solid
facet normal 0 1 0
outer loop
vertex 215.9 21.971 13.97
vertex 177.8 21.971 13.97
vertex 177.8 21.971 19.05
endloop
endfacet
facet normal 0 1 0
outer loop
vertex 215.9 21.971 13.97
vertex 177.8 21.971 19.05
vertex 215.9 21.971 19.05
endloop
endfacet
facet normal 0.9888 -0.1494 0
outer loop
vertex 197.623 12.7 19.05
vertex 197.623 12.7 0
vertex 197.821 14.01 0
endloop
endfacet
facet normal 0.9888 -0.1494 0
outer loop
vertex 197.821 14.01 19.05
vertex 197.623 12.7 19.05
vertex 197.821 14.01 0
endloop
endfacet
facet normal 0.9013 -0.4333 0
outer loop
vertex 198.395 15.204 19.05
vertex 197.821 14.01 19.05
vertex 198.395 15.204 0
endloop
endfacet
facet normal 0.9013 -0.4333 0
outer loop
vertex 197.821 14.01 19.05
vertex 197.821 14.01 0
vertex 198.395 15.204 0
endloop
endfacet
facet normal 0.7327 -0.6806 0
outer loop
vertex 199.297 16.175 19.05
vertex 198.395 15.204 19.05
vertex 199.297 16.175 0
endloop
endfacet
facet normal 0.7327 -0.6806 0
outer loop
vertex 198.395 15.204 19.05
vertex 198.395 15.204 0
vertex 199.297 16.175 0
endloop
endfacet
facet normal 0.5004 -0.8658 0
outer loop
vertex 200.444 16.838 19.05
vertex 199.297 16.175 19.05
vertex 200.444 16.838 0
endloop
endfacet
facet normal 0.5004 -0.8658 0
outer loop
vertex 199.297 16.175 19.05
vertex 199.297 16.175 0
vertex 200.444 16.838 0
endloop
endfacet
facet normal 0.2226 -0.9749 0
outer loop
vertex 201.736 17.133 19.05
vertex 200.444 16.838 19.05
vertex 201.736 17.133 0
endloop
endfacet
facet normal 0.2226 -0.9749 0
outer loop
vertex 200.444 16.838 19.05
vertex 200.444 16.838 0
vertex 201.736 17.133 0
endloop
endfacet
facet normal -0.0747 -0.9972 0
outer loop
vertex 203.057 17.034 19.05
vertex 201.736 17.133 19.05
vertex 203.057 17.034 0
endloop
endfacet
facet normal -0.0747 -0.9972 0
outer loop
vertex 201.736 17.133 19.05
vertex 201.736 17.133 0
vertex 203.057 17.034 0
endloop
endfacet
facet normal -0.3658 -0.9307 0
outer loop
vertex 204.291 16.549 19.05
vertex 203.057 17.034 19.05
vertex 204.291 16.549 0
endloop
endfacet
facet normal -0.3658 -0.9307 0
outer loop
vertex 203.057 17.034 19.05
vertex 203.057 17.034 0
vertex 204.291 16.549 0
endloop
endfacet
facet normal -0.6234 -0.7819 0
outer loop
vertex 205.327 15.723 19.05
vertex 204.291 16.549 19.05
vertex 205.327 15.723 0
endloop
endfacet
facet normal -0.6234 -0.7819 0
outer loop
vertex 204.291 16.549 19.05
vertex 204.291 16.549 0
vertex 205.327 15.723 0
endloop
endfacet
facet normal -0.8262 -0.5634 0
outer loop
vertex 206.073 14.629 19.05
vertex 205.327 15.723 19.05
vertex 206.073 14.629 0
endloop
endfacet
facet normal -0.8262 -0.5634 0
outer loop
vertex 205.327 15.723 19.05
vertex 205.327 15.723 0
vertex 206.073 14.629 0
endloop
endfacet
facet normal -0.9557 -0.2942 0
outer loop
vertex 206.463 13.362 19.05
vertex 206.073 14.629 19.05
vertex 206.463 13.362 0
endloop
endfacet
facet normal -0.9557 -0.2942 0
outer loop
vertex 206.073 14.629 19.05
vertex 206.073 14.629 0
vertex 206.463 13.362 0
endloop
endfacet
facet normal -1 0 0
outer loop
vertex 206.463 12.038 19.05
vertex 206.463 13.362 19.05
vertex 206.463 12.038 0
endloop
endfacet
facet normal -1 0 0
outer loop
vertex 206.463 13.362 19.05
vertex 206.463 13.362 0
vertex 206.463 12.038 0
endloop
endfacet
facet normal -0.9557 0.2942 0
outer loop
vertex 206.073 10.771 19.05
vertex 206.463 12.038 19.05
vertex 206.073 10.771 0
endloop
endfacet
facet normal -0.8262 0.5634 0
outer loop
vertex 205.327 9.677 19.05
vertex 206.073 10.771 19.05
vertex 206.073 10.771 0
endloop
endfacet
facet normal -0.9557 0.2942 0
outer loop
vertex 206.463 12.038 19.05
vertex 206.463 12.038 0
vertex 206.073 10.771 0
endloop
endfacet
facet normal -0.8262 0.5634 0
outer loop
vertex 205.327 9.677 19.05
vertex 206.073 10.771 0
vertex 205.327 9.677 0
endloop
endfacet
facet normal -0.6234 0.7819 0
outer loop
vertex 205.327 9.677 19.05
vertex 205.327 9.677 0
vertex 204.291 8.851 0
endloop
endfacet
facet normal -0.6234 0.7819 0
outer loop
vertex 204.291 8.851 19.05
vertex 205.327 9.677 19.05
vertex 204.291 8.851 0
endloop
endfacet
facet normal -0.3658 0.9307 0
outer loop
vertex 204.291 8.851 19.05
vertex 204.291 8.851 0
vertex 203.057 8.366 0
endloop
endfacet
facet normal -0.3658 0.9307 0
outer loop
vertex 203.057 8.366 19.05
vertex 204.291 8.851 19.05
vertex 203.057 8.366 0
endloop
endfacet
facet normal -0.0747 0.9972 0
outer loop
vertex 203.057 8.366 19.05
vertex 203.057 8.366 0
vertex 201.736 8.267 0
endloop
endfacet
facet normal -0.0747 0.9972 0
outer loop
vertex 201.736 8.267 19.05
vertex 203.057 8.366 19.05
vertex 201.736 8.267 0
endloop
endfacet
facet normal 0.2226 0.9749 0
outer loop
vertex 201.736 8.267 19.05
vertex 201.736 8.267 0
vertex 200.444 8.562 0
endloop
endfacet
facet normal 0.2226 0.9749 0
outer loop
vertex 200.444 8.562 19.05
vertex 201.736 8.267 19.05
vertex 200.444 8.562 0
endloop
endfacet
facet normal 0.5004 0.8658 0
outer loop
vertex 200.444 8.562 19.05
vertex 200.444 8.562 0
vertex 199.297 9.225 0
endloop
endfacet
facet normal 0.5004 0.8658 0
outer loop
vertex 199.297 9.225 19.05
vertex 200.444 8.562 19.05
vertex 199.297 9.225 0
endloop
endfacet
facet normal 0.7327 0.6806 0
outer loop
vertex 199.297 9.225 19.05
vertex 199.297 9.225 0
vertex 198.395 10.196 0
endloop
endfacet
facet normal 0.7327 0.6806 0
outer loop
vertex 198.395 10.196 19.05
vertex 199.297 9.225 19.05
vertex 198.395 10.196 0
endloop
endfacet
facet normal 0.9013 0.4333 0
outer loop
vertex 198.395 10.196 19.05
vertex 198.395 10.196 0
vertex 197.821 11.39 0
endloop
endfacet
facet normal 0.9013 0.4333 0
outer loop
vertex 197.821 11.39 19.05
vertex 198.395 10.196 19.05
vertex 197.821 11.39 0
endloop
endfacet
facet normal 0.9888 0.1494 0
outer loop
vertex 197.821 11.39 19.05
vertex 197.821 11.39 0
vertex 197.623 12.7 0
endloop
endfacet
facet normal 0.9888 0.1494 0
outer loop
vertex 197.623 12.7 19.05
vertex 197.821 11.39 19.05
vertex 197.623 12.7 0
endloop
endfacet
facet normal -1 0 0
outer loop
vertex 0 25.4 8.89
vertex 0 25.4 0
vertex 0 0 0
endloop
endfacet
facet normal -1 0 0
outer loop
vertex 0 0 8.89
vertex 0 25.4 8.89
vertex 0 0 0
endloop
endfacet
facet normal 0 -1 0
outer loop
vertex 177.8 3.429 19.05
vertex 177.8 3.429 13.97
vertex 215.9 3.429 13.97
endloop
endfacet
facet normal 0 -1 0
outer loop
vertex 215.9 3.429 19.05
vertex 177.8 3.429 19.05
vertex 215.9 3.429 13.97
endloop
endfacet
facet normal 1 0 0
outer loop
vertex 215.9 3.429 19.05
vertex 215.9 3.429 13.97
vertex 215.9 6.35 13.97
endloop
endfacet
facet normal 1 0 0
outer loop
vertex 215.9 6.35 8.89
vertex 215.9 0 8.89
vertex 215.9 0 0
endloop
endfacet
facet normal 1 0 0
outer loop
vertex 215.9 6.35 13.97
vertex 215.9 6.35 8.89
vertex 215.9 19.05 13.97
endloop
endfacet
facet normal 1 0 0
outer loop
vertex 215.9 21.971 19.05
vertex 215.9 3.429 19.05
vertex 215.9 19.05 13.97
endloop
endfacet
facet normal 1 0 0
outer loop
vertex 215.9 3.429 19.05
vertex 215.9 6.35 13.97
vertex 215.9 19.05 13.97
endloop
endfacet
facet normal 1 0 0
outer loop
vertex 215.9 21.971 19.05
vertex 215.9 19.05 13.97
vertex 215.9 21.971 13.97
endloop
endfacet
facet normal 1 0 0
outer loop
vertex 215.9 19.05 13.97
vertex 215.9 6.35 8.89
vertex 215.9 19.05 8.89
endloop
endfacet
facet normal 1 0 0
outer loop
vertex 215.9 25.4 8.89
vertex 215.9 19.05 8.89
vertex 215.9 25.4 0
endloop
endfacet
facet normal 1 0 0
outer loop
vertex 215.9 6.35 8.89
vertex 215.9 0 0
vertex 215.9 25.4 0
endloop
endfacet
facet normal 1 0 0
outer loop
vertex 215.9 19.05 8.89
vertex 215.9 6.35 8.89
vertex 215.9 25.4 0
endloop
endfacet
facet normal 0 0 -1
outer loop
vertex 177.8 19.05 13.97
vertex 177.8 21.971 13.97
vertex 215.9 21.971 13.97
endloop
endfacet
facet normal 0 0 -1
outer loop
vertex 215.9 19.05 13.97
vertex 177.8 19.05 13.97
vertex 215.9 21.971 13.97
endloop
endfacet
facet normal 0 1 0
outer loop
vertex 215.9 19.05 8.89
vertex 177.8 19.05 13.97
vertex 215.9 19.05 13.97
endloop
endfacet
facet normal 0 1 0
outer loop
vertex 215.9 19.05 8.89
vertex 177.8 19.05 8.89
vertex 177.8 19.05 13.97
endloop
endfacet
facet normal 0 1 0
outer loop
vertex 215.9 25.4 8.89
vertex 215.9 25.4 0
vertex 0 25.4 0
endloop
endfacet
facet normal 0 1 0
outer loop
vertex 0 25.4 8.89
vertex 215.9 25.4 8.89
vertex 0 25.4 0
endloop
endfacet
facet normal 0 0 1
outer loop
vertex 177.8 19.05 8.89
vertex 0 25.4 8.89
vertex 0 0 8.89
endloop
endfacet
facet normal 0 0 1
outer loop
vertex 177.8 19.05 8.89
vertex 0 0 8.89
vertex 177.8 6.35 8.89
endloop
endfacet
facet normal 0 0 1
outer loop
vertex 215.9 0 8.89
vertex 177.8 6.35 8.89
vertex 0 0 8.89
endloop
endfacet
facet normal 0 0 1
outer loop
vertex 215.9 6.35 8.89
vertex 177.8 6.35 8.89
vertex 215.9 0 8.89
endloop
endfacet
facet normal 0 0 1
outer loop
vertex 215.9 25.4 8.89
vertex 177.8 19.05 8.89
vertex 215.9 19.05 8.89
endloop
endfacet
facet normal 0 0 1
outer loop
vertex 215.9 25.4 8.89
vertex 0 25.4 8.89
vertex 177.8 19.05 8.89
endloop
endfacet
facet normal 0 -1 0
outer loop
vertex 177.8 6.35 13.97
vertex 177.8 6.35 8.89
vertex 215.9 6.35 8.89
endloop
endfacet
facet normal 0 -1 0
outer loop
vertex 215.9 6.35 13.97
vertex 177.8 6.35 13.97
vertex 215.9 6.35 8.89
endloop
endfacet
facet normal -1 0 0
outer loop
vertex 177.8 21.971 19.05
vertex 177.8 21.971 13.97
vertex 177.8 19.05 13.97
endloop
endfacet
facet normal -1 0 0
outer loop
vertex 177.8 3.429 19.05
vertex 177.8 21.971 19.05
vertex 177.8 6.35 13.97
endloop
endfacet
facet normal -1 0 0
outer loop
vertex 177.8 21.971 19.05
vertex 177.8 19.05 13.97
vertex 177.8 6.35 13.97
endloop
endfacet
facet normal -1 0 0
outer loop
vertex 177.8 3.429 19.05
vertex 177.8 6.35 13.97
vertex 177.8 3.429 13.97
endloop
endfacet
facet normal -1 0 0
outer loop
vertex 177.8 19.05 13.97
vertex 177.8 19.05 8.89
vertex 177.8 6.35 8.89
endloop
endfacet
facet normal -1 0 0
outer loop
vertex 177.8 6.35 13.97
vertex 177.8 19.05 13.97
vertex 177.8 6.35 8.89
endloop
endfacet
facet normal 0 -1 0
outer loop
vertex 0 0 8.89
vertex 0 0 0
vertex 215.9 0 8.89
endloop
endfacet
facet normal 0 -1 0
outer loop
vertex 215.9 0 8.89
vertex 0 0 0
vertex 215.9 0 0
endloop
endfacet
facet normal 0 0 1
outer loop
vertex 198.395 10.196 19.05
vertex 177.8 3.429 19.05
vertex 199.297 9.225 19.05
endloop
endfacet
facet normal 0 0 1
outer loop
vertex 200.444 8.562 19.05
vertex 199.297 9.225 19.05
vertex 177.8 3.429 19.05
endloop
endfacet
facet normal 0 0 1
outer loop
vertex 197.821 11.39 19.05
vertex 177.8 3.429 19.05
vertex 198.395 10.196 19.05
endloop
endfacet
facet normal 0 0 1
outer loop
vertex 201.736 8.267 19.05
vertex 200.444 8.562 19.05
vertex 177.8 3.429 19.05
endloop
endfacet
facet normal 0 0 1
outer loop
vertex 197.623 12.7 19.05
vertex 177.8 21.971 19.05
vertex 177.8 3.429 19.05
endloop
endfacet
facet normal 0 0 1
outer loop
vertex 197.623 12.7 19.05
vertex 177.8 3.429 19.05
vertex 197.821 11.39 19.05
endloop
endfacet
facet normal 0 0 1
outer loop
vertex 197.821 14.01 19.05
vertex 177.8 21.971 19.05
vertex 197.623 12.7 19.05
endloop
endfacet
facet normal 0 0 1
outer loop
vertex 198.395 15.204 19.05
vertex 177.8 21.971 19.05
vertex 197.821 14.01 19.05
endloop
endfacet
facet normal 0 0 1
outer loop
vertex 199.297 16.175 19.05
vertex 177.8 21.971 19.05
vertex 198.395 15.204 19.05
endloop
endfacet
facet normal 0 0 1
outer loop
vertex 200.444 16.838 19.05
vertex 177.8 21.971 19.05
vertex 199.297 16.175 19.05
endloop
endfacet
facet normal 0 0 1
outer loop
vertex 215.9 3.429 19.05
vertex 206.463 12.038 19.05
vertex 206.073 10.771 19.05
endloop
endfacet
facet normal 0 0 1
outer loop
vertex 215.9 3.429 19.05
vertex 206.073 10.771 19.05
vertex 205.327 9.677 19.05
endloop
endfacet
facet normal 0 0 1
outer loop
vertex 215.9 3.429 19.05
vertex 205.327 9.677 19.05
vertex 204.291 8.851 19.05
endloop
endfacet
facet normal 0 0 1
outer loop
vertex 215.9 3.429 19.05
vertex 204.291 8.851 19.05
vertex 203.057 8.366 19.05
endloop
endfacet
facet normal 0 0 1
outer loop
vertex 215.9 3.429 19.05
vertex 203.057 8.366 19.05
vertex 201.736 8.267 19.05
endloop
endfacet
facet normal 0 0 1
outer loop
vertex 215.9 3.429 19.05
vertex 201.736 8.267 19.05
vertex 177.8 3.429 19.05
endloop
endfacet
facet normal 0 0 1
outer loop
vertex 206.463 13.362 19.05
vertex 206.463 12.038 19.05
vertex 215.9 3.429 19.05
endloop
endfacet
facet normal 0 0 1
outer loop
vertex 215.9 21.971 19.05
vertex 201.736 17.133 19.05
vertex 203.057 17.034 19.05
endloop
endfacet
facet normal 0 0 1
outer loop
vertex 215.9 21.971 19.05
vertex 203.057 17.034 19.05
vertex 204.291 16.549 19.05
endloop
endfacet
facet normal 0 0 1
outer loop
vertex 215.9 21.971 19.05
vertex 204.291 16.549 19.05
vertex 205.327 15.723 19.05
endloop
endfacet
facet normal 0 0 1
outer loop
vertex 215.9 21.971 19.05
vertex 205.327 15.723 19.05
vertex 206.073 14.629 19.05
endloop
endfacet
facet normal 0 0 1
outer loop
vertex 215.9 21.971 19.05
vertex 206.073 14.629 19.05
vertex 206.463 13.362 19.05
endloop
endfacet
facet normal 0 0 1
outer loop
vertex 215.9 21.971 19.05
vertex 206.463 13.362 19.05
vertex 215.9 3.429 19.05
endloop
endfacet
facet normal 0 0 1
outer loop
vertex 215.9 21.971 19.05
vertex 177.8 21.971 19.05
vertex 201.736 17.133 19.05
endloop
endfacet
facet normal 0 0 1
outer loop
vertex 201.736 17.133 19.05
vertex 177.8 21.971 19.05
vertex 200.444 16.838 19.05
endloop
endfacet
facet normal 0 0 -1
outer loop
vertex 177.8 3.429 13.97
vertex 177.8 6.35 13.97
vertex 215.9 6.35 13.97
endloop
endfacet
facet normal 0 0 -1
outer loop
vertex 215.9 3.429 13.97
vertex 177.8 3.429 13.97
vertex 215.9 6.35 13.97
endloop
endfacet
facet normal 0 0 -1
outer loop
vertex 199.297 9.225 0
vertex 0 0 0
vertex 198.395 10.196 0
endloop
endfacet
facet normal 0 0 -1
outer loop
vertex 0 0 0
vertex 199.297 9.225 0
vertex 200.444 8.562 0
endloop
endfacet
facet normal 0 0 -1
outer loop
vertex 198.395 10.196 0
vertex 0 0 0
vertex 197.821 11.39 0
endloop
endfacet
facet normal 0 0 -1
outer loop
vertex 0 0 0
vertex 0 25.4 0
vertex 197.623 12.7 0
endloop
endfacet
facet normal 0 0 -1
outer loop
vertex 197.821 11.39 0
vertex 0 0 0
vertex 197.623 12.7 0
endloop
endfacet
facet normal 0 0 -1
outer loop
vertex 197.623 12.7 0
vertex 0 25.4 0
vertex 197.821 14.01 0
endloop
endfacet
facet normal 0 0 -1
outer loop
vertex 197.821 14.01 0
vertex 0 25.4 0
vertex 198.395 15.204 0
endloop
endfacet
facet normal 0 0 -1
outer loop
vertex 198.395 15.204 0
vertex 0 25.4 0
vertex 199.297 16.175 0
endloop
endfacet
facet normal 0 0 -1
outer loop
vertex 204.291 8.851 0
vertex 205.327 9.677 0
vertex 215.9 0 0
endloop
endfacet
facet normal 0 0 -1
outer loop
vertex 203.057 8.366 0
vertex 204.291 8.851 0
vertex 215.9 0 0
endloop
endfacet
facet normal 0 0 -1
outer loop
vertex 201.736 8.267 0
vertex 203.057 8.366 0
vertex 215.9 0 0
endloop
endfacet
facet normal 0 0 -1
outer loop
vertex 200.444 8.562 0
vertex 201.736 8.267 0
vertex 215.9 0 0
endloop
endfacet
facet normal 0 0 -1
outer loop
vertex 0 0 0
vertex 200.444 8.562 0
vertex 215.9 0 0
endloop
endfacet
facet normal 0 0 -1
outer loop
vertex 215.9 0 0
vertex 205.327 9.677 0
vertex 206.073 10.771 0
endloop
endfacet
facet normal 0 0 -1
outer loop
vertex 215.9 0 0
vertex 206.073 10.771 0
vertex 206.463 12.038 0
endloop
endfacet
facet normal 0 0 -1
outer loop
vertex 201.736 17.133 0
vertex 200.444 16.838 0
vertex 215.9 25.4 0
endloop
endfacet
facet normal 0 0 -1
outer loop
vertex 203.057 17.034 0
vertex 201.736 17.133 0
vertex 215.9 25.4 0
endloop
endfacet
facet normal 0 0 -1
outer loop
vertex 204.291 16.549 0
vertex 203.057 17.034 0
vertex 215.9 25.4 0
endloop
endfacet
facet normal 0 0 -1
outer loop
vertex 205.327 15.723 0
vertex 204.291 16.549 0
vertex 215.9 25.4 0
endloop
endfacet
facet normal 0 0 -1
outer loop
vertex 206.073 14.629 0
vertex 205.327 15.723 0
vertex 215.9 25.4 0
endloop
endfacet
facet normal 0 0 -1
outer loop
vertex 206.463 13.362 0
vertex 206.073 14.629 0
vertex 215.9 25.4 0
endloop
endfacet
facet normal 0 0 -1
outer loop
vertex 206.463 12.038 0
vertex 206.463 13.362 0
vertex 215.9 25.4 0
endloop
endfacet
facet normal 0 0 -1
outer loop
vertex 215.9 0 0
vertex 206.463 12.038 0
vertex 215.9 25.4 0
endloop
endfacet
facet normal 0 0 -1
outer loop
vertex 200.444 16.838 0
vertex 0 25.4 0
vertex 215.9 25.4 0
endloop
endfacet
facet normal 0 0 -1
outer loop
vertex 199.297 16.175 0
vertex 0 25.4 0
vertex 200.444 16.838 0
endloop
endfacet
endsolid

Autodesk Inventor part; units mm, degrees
ref_plane "YZ Plane" through (0, 0, 0) normal (1, 0, 0) x (0, 1, 0)
ref_plane "XZ Plane" through (0, 0, 0) normal (0, 1, 0) x (-1, 0, 0)
ref_plane "XY Plane" through (0, 0, 0) normal (0, 0, 1) x (1, 0, 0)
sketch "Sketch1" plane through (0, 0, 0) normal (0, 0, 1) x (1, 0, 0)
  line L0 (0, 0) -> (215.9, 0)
  line L1 (215.9, 0) -> (215.9, 25.4)
  line L2 (215.9, 25.4) -> (0, 25.4)
  line L3 (0, 25.4) -> (0, 0)
  dimension "d0" = 215.9
  dimension "d1" = 25.4
extrude "Extrusion1" add sketch "Sketch1" along normal blind 8.89
sketch "Sketch2" plane through (0, 0, 8.89) normal (0, 0, 1) x (1, 0, 0)
  line L0 (0, 0) -> (215.9, 0) projected
  line L1 (215.9, 0) -> (215.9, 25.4) projected
  line L2 (215.9, 25.4) -> (177.8, 25.4)
  line L3 (177.8, 25.4) -> (177.8, 0)
  line L4 (177.8, 0) -> (215.9, 0)
  line L5 (215.9, 0) -> (215.9, 25.4)
  line L6 (215.9, 25.4) -> (177.8, 25.4)
  line L7 (177.8, 25.4) -> (177.8, 12.7)
  line L8 (177.8, 12.7) -> (215.9, 12.7)
  line L9 (215.9, 12.7) -> (215.9, 25.4)
  line L10 (215.9, 25.4) -> (177.8, 25.4)
  line L11 (177.8, 25.4) -> (177.8, 19.05)
  line L12 (177.8, 19.05) -> (215.9, 19.05)
  line L13 (215.9, 19.05) -> (215.9, 25.4)
  line L14 (215.9, 0) -> (177.8, 0)
  line L15 (177.8, 0) -> (177.8, 6.35)
  line L16 (177.8, 6.35) -> (215.9, 6.35)
  line L17 (215.9, 6.35) -> (215.9, 0)
  dimension "d4" = 6.35
  dimension "d5" = 38.1
extrude "Extrusion2" add sketch "Sketch2" along normal blind 5.08 contours L3 L8 L1 L16 | L3 L12 L1 L8
sketch "Sketch3" plane through (0, 0, 13.97) normal (0, 0, 1) x (1, 0, 0)
  line L0 (215.9, 19.05) -> (177.8, 19.05) projected
  line L1 (177.8, 19.05) -> (177.8, 6.35) projected
  line L2 (177.8, 6.35) -> (215.9, 6.35)
  line L3 (215.9, 6.35) -> (215.9, 19.05)
  line L4 (215.9, 19.05) -> (177.8, 19.05)
  line L5 (177.8, 19.05) -> (177.8, 6.35)
  line L6 (215.9, 19.05) -> (177.8, 19.05)
  line L7 (177.8, 19.05) -> (177.8, 21.971)
  line L8 (177.8, 21.971) -> (215.9, 21.971)
  line L9 (215.9, 21.971) -> (215.9, 19.05)
  line L10 (215.9, 6.35) -> (177.8, 6.35)
  line L11 (177.8, 6.35) -> (177.8, 3.429)
  line L12 (177.8, 3.429) -> (215.9, 3.429)
  line L13 (215.9, 3.429) -> (215.9, 6.35)
  point P0 (0, 0)
  dimension "d8" = 2.921
  dimension "d9" = 2.921
extrude "Extrusion3" add sketch "Sketch3" along normal blind 5.08
sketch "Sketch4" plane through (0, 0, 0) normal (0, 0, -1) x (-1, 0, 0)
  circle A0 centre (-202.0681, 12.7) radius 4.445
  dimension "d12" = 8.89
extrude "Extrusion4" cut sketch "Sketch4" against normal blind 127
properties part number "Piece One-" material "Steel"
